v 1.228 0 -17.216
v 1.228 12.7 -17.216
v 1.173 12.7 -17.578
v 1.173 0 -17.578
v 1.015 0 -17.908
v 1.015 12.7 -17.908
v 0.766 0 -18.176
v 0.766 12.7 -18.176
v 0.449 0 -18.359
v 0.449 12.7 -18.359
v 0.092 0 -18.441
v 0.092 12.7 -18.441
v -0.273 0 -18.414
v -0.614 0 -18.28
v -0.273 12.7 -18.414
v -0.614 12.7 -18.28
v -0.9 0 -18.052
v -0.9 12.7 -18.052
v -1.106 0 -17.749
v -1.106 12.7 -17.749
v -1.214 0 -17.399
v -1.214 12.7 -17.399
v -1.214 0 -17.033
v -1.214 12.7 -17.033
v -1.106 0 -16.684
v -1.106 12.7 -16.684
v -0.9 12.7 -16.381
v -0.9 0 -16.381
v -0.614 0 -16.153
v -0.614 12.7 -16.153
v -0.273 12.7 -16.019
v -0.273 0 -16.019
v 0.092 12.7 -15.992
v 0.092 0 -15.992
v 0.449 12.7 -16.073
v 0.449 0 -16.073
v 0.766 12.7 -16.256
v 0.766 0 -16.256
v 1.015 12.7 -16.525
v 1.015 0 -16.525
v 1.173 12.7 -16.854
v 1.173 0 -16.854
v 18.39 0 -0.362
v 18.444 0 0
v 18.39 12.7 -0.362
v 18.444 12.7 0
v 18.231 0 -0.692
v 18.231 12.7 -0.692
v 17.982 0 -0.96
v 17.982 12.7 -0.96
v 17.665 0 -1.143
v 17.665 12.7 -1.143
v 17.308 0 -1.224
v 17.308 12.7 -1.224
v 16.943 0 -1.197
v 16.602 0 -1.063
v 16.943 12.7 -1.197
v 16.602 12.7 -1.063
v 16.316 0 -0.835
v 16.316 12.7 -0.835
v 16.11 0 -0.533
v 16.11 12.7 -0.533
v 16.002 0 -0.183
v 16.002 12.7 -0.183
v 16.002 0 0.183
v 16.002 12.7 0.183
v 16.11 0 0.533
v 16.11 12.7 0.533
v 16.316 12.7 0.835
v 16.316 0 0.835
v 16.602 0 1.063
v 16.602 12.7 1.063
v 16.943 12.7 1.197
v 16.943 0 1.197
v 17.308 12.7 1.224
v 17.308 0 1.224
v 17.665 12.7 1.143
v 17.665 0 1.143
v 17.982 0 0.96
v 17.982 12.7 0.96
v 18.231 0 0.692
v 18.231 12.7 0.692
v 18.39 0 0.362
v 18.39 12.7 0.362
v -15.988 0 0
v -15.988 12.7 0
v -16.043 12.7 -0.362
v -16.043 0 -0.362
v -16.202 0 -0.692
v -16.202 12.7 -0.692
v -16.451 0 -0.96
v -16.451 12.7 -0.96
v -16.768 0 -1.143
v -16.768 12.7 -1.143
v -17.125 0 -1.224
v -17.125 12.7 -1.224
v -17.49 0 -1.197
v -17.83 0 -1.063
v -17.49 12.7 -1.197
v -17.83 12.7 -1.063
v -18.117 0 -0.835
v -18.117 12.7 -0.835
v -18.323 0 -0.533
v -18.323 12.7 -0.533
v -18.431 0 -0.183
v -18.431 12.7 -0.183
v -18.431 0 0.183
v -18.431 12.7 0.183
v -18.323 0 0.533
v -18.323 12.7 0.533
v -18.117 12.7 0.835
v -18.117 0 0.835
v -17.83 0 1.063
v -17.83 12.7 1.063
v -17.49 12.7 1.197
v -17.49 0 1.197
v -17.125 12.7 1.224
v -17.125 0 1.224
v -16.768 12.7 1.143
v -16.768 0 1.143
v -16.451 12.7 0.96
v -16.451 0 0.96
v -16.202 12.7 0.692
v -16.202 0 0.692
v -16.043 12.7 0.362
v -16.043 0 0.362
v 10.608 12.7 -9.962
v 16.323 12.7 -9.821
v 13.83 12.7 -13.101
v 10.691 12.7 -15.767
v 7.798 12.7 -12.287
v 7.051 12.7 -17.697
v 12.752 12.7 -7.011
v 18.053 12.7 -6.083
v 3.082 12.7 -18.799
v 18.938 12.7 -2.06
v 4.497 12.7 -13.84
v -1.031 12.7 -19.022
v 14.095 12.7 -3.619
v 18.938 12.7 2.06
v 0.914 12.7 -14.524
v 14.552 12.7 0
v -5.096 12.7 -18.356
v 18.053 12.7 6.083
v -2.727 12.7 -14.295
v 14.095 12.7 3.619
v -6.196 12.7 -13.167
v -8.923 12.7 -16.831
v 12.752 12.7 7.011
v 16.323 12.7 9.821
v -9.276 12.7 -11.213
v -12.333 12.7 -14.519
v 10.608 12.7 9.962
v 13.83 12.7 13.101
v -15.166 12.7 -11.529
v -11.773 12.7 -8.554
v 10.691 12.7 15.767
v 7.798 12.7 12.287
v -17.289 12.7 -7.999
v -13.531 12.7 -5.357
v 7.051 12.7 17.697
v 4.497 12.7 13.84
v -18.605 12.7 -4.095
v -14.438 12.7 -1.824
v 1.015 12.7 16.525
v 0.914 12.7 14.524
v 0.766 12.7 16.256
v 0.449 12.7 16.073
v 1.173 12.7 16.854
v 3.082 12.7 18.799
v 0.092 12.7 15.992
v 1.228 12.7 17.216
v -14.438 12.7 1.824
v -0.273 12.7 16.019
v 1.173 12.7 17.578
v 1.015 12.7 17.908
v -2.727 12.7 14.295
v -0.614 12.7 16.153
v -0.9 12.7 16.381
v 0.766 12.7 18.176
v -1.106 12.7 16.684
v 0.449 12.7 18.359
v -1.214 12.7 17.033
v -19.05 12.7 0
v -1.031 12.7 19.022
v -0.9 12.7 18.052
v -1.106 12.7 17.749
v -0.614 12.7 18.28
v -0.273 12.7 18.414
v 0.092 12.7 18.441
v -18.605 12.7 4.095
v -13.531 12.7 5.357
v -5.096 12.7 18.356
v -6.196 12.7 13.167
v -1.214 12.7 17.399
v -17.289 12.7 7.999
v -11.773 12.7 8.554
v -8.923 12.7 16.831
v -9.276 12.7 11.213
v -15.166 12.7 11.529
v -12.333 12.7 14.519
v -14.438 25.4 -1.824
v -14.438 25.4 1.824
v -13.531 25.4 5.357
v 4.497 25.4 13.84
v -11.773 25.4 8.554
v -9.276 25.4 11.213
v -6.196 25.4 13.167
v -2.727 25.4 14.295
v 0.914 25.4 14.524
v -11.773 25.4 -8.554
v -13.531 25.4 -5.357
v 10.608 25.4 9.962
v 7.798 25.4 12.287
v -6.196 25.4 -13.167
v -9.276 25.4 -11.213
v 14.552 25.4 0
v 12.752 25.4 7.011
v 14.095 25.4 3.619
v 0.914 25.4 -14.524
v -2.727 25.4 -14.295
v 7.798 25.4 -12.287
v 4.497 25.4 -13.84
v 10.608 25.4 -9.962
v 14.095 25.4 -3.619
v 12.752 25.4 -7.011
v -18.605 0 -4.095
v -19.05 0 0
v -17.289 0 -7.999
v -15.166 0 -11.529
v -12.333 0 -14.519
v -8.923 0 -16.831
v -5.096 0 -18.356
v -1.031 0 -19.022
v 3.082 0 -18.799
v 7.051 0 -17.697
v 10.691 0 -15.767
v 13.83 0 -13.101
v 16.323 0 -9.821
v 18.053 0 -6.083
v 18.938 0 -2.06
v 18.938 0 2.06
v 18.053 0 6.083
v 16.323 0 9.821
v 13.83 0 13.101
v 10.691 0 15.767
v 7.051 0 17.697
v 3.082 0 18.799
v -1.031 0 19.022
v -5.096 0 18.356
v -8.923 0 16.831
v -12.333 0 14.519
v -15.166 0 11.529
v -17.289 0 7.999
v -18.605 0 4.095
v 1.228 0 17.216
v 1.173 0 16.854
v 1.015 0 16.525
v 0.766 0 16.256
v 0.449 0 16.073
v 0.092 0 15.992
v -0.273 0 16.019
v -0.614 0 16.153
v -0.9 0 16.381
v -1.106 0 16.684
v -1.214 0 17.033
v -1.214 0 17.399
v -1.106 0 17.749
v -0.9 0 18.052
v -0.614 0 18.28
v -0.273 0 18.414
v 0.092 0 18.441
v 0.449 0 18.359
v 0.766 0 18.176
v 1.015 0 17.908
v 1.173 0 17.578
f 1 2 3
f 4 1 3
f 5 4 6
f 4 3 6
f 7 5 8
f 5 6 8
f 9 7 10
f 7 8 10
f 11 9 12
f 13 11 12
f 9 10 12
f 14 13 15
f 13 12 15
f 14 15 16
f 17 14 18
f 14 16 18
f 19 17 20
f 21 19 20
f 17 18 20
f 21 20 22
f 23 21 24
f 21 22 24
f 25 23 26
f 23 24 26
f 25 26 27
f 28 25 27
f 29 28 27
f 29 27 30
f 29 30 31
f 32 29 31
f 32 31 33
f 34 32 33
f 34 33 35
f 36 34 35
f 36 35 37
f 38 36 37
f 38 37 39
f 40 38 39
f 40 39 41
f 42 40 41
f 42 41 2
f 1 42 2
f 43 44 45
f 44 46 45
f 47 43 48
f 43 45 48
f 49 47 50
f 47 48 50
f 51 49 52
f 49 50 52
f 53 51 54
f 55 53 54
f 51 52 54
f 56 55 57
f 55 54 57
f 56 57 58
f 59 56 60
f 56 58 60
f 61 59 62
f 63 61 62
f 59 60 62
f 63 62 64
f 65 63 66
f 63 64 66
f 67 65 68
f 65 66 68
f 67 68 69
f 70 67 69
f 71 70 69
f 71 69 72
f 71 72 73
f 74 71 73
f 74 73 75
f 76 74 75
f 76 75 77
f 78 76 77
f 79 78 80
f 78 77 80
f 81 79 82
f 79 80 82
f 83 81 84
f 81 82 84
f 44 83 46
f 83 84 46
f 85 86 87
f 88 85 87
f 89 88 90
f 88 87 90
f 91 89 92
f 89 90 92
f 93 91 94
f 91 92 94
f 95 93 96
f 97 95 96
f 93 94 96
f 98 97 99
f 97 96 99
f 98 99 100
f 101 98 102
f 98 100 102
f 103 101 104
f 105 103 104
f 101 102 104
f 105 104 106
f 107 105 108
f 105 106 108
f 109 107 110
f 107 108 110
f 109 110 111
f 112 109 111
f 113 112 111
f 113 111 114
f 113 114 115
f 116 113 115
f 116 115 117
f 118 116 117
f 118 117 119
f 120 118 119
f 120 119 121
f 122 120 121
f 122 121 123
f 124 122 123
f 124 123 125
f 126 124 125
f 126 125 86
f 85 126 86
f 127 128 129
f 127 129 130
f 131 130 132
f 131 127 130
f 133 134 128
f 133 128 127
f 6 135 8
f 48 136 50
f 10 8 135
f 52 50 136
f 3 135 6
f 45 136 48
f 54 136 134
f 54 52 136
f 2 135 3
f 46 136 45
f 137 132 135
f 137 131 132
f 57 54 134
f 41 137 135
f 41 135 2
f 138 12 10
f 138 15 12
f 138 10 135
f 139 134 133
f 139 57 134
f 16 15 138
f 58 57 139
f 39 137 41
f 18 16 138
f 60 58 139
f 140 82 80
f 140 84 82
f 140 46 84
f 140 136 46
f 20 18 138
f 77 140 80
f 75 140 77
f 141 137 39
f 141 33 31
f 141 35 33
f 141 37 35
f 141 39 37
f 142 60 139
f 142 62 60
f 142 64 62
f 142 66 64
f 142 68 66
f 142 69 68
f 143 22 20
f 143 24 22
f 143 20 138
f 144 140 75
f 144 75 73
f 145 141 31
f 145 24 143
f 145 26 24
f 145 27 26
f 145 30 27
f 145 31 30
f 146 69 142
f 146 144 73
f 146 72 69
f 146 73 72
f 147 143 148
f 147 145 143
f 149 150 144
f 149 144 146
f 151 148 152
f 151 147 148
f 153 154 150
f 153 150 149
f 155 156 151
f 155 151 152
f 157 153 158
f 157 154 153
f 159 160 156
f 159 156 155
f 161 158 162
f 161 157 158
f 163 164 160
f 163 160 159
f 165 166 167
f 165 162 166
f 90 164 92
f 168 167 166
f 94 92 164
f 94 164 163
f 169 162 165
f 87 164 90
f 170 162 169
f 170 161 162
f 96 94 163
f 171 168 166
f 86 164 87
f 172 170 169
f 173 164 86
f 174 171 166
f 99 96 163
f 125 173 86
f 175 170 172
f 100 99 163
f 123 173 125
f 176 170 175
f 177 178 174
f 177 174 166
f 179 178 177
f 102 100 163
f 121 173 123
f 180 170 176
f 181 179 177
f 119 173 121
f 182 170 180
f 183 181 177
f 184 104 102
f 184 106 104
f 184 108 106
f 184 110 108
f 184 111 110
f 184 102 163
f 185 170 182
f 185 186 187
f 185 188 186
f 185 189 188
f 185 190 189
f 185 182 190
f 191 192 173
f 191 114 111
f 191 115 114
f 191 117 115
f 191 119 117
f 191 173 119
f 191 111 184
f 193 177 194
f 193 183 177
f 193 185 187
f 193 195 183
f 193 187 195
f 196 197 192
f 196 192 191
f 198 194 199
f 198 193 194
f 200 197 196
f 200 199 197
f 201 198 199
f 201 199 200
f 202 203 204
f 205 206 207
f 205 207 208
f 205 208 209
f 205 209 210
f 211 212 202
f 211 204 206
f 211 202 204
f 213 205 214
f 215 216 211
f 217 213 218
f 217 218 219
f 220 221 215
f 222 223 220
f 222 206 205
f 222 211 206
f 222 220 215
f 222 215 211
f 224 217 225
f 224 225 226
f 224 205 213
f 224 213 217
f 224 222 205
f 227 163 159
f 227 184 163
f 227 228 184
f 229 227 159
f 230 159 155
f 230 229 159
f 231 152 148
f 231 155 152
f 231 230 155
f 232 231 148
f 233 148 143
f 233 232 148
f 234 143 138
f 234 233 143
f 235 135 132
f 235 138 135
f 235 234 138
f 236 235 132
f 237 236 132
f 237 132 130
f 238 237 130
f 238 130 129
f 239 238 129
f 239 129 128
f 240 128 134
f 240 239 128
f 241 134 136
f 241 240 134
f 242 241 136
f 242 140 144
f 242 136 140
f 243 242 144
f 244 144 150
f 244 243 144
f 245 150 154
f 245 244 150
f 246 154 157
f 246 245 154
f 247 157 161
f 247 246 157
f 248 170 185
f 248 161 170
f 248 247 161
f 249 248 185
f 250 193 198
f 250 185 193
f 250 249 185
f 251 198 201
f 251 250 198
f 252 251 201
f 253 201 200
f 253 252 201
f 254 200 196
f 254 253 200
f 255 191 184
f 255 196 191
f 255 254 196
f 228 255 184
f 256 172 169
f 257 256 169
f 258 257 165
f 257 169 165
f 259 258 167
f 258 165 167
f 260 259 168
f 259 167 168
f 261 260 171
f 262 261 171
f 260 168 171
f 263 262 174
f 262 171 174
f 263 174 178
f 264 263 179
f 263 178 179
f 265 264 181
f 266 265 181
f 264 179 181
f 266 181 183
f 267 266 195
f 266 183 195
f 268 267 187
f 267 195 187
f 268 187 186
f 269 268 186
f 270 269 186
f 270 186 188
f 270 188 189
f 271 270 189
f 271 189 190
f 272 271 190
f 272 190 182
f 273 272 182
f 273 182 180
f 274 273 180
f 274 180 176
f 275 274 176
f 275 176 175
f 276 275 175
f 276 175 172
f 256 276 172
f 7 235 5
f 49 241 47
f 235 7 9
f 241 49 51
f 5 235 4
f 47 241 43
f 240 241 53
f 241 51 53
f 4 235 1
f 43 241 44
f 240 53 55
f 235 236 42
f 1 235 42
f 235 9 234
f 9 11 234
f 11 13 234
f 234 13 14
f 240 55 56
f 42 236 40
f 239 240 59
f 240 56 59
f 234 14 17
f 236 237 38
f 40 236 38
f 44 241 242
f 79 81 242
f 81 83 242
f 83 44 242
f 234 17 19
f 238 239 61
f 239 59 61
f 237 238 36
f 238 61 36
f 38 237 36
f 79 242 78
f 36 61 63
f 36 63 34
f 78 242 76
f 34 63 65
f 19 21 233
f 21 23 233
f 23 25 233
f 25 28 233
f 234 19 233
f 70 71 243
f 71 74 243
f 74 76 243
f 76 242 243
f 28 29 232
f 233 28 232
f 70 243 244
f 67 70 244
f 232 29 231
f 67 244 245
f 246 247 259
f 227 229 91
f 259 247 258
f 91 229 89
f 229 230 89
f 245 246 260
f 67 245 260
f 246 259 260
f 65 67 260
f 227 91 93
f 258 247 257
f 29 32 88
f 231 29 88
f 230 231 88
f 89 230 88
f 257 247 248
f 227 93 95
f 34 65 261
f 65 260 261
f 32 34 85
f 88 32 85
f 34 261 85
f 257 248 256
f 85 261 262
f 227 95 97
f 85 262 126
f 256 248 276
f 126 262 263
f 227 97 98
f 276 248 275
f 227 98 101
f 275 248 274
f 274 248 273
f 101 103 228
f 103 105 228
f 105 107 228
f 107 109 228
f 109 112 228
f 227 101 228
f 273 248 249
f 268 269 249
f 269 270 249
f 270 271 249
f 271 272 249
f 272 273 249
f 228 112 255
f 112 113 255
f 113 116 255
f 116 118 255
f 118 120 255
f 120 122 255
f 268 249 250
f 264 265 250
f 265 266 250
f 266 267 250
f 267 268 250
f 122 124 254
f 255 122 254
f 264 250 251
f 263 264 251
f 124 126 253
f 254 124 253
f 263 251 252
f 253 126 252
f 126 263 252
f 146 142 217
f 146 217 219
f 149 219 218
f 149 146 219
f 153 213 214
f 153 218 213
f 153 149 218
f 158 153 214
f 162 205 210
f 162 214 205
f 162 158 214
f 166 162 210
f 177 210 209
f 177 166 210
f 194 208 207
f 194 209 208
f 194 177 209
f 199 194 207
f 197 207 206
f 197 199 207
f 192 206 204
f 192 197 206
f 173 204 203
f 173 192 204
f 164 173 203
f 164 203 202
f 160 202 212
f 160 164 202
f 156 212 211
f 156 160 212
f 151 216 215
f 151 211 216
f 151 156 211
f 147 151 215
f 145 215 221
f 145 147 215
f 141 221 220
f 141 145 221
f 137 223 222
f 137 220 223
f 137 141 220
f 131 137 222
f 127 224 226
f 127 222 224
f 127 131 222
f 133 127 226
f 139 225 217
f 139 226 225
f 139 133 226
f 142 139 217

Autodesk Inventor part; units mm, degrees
ref_plane "YZ Plane" through (0, 0, 0) normal (1, 0, 0) x (0, 1, 0)
ref_plane "XZ Plane" through (0, 0, 0) normal (0, 1, 0) x (-1, 0, 0)
ref_plane "XY Plane" through (0, 0, 0) normal (0, 0, 1) x (1, 0, 0)
sketch "Sketch1" plane through (0, 0, 0) normal (0, 1, 0) x (-1, 0, 0)
  circle A0 centre (0, 0) radius 19.05
  dimension "d0" = 38.1
extrude "Extrusion1" add sketch "Sketch1" along normal blind 12.7
sketch "Sketch2" plane through (0, 12.7, 0) normal (0, 1, 0) x (1, 0, 0)
  circle A0 centre (-17.2164, 0) radius 1.2279
  circle A1 centre (0, -17.2164) radius 1.2279
  circle A2 centre (17.2164, 0) radius 1.2279
  circle A3 centre (0, 17.2164) radius 1.2279
  circle A4 centre (0, 0) radius 14.5525
  dimension "d5" = 360
extrude "Extrusion2" add sketch "Sketch2" along normal blind 12.7 contours A4
extrude "Extrusion3" cut sketch "Sketch2" against normal up to next contours A0 | A1 | A2 | A3
properties part number "7.2 part 2"
